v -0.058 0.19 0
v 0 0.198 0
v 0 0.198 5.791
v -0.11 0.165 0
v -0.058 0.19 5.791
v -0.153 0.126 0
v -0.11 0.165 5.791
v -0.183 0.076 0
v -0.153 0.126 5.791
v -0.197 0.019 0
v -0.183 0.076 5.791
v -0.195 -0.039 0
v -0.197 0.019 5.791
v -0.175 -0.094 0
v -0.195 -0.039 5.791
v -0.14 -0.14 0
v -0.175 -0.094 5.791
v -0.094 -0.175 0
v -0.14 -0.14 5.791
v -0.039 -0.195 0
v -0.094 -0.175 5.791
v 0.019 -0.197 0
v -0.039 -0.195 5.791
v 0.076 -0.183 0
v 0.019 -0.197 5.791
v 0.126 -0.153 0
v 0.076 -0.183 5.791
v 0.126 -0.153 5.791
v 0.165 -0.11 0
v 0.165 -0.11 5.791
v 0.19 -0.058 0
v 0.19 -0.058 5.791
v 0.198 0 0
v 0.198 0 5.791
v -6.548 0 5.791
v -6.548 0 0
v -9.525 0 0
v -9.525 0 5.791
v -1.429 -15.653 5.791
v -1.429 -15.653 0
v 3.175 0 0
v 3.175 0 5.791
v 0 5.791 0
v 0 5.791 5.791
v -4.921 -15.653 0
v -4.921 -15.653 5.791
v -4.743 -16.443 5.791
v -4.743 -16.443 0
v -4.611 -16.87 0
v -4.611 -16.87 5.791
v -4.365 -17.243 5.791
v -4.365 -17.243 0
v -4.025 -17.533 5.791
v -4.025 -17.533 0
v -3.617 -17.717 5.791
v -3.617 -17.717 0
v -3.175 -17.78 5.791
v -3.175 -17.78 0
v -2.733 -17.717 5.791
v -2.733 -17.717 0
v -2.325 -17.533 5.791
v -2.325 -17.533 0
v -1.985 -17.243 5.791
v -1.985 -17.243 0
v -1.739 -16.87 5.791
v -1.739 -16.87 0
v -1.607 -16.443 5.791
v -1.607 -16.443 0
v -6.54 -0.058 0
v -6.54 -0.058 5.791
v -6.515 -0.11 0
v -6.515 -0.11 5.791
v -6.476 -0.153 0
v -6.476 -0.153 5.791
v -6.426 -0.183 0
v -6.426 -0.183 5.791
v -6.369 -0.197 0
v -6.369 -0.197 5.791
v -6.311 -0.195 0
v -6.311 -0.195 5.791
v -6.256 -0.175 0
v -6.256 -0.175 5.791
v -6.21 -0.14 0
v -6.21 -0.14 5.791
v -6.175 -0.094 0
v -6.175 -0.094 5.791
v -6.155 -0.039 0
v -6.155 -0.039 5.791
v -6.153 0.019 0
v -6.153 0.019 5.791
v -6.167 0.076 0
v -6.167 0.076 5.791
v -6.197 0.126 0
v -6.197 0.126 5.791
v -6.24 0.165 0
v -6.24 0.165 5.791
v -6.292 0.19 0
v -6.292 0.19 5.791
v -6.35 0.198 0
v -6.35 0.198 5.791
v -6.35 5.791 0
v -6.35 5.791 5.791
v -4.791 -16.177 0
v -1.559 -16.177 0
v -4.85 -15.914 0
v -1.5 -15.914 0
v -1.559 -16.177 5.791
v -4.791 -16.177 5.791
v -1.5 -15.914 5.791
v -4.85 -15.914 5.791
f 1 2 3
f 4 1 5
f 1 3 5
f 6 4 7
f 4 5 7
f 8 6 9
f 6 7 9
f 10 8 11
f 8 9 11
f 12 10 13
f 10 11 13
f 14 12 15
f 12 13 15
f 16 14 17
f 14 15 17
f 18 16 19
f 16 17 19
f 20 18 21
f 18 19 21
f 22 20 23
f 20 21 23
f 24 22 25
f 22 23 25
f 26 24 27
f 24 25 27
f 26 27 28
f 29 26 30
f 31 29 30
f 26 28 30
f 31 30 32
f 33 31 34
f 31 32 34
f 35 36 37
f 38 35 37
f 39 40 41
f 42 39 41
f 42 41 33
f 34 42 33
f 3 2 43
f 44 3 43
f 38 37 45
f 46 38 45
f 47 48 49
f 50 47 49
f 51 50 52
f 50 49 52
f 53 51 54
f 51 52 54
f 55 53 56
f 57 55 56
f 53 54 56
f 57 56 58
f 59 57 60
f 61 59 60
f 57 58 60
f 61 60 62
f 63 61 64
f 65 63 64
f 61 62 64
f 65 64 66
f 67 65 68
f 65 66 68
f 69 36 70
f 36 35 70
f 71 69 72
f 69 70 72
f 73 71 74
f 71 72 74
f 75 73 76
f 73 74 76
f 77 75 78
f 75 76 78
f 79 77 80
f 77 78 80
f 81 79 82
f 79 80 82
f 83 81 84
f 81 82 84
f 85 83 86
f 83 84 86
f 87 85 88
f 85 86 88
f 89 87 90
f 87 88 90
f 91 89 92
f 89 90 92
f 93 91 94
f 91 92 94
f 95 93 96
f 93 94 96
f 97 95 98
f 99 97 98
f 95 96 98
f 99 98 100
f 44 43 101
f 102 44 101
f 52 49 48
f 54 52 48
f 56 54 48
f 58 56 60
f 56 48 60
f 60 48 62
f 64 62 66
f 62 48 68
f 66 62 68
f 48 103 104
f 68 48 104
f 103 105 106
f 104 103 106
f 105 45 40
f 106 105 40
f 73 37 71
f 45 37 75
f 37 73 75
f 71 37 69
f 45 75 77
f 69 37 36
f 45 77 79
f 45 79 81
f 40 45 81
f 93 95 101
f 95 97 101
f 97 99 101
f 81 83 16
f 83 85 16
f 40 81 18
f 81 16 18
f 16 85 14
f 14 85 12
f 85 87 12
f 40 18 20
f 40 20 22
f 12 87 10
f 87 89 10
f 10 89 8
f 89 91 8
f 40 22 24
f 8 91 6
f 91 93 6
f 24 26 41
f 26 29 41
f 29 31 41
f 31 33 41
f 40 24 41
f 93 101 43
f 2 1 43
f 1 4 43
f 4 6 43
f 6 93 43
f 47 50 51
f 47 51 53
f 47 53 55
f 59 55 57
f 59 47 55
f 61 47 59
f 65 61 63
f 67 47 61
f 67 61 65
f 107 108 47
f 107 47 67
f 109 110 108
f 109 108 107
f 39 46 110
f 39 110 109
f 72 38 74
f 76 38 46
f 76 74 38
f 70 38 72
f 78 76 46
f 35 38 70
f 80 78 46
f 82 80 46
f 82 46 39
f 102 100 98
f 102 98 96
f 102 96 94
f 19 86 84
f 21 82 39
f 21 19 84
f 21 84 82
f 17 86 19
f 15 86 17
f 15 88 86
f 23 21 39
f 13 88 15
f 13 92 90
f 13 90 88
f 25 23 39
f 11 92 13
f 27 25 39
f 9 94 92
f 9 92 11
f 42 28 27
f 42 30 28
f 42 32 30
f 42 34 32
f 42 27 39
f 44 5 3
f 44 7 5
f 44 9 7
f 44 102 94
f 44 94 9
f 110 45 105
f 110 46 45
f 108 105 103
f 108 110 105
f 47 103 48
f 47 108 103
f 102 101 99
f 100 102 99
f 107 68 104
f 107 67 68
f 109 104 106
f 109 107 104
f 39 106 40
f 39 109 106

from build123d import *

# Parameters (mm, degrees)
BOSS_EXTRUDE1_DEPTH = 5.7912
FILLET1_R           = 6.35
SKETCH2_R           = 0.1984375
CUT_EXTRUDE1_DEPTH  = 6.7912


with BuildPart() as part:
    # Sketch1 → Boss-Extrude1 (new body)
    with BuildSketch(Plane.XY):
        with BuildLine():
            Line((-6.35, 0), (-9.525, 0))
            Line((-9.525, 0), (-4.7625, -16.1925))
            ThreePointArc((-4.7625, -16.1925), (-3.175, -17.78), (-1.5875, -16.1925))
            Line((-1.5875, -16.1925), (3.175, 0))
            Line((3.175, 0), (0, 0))
            Line((0, 0), (0, 5.7912))
            Line((0, 5.7912), (-6.35, 5.7912))
            Line((-6.35, 5.7912), (-6.35, 0))
        make_face()
    extrude(amount=BOSS_EXTRUDE1_DEPTH)

    # Fillet1
    fillet1_edges = [part.edges().sort_by_distance(p)[0] for p in [
        (-1.5875, -16.1925, 2.8956),
        (-4.7625, -16.1925, 2.8956),
    ]]
    fillet(fillet1_edges, radius=FILLET1_R)

    # Sketch2 → Cut-Extrude1 (cut, through all)
    with BuildSketch(Plane.XY.offset(5.7912)):
        with Locations((-6.35, 0)):
            Circle(SKETCH2_R)
        Circle(SKETCH2_R)
    extrude(amount=-CUT_EXTRUDE1_DEPTH, mode=Mode.SUBTRACT)


solid = part.part
